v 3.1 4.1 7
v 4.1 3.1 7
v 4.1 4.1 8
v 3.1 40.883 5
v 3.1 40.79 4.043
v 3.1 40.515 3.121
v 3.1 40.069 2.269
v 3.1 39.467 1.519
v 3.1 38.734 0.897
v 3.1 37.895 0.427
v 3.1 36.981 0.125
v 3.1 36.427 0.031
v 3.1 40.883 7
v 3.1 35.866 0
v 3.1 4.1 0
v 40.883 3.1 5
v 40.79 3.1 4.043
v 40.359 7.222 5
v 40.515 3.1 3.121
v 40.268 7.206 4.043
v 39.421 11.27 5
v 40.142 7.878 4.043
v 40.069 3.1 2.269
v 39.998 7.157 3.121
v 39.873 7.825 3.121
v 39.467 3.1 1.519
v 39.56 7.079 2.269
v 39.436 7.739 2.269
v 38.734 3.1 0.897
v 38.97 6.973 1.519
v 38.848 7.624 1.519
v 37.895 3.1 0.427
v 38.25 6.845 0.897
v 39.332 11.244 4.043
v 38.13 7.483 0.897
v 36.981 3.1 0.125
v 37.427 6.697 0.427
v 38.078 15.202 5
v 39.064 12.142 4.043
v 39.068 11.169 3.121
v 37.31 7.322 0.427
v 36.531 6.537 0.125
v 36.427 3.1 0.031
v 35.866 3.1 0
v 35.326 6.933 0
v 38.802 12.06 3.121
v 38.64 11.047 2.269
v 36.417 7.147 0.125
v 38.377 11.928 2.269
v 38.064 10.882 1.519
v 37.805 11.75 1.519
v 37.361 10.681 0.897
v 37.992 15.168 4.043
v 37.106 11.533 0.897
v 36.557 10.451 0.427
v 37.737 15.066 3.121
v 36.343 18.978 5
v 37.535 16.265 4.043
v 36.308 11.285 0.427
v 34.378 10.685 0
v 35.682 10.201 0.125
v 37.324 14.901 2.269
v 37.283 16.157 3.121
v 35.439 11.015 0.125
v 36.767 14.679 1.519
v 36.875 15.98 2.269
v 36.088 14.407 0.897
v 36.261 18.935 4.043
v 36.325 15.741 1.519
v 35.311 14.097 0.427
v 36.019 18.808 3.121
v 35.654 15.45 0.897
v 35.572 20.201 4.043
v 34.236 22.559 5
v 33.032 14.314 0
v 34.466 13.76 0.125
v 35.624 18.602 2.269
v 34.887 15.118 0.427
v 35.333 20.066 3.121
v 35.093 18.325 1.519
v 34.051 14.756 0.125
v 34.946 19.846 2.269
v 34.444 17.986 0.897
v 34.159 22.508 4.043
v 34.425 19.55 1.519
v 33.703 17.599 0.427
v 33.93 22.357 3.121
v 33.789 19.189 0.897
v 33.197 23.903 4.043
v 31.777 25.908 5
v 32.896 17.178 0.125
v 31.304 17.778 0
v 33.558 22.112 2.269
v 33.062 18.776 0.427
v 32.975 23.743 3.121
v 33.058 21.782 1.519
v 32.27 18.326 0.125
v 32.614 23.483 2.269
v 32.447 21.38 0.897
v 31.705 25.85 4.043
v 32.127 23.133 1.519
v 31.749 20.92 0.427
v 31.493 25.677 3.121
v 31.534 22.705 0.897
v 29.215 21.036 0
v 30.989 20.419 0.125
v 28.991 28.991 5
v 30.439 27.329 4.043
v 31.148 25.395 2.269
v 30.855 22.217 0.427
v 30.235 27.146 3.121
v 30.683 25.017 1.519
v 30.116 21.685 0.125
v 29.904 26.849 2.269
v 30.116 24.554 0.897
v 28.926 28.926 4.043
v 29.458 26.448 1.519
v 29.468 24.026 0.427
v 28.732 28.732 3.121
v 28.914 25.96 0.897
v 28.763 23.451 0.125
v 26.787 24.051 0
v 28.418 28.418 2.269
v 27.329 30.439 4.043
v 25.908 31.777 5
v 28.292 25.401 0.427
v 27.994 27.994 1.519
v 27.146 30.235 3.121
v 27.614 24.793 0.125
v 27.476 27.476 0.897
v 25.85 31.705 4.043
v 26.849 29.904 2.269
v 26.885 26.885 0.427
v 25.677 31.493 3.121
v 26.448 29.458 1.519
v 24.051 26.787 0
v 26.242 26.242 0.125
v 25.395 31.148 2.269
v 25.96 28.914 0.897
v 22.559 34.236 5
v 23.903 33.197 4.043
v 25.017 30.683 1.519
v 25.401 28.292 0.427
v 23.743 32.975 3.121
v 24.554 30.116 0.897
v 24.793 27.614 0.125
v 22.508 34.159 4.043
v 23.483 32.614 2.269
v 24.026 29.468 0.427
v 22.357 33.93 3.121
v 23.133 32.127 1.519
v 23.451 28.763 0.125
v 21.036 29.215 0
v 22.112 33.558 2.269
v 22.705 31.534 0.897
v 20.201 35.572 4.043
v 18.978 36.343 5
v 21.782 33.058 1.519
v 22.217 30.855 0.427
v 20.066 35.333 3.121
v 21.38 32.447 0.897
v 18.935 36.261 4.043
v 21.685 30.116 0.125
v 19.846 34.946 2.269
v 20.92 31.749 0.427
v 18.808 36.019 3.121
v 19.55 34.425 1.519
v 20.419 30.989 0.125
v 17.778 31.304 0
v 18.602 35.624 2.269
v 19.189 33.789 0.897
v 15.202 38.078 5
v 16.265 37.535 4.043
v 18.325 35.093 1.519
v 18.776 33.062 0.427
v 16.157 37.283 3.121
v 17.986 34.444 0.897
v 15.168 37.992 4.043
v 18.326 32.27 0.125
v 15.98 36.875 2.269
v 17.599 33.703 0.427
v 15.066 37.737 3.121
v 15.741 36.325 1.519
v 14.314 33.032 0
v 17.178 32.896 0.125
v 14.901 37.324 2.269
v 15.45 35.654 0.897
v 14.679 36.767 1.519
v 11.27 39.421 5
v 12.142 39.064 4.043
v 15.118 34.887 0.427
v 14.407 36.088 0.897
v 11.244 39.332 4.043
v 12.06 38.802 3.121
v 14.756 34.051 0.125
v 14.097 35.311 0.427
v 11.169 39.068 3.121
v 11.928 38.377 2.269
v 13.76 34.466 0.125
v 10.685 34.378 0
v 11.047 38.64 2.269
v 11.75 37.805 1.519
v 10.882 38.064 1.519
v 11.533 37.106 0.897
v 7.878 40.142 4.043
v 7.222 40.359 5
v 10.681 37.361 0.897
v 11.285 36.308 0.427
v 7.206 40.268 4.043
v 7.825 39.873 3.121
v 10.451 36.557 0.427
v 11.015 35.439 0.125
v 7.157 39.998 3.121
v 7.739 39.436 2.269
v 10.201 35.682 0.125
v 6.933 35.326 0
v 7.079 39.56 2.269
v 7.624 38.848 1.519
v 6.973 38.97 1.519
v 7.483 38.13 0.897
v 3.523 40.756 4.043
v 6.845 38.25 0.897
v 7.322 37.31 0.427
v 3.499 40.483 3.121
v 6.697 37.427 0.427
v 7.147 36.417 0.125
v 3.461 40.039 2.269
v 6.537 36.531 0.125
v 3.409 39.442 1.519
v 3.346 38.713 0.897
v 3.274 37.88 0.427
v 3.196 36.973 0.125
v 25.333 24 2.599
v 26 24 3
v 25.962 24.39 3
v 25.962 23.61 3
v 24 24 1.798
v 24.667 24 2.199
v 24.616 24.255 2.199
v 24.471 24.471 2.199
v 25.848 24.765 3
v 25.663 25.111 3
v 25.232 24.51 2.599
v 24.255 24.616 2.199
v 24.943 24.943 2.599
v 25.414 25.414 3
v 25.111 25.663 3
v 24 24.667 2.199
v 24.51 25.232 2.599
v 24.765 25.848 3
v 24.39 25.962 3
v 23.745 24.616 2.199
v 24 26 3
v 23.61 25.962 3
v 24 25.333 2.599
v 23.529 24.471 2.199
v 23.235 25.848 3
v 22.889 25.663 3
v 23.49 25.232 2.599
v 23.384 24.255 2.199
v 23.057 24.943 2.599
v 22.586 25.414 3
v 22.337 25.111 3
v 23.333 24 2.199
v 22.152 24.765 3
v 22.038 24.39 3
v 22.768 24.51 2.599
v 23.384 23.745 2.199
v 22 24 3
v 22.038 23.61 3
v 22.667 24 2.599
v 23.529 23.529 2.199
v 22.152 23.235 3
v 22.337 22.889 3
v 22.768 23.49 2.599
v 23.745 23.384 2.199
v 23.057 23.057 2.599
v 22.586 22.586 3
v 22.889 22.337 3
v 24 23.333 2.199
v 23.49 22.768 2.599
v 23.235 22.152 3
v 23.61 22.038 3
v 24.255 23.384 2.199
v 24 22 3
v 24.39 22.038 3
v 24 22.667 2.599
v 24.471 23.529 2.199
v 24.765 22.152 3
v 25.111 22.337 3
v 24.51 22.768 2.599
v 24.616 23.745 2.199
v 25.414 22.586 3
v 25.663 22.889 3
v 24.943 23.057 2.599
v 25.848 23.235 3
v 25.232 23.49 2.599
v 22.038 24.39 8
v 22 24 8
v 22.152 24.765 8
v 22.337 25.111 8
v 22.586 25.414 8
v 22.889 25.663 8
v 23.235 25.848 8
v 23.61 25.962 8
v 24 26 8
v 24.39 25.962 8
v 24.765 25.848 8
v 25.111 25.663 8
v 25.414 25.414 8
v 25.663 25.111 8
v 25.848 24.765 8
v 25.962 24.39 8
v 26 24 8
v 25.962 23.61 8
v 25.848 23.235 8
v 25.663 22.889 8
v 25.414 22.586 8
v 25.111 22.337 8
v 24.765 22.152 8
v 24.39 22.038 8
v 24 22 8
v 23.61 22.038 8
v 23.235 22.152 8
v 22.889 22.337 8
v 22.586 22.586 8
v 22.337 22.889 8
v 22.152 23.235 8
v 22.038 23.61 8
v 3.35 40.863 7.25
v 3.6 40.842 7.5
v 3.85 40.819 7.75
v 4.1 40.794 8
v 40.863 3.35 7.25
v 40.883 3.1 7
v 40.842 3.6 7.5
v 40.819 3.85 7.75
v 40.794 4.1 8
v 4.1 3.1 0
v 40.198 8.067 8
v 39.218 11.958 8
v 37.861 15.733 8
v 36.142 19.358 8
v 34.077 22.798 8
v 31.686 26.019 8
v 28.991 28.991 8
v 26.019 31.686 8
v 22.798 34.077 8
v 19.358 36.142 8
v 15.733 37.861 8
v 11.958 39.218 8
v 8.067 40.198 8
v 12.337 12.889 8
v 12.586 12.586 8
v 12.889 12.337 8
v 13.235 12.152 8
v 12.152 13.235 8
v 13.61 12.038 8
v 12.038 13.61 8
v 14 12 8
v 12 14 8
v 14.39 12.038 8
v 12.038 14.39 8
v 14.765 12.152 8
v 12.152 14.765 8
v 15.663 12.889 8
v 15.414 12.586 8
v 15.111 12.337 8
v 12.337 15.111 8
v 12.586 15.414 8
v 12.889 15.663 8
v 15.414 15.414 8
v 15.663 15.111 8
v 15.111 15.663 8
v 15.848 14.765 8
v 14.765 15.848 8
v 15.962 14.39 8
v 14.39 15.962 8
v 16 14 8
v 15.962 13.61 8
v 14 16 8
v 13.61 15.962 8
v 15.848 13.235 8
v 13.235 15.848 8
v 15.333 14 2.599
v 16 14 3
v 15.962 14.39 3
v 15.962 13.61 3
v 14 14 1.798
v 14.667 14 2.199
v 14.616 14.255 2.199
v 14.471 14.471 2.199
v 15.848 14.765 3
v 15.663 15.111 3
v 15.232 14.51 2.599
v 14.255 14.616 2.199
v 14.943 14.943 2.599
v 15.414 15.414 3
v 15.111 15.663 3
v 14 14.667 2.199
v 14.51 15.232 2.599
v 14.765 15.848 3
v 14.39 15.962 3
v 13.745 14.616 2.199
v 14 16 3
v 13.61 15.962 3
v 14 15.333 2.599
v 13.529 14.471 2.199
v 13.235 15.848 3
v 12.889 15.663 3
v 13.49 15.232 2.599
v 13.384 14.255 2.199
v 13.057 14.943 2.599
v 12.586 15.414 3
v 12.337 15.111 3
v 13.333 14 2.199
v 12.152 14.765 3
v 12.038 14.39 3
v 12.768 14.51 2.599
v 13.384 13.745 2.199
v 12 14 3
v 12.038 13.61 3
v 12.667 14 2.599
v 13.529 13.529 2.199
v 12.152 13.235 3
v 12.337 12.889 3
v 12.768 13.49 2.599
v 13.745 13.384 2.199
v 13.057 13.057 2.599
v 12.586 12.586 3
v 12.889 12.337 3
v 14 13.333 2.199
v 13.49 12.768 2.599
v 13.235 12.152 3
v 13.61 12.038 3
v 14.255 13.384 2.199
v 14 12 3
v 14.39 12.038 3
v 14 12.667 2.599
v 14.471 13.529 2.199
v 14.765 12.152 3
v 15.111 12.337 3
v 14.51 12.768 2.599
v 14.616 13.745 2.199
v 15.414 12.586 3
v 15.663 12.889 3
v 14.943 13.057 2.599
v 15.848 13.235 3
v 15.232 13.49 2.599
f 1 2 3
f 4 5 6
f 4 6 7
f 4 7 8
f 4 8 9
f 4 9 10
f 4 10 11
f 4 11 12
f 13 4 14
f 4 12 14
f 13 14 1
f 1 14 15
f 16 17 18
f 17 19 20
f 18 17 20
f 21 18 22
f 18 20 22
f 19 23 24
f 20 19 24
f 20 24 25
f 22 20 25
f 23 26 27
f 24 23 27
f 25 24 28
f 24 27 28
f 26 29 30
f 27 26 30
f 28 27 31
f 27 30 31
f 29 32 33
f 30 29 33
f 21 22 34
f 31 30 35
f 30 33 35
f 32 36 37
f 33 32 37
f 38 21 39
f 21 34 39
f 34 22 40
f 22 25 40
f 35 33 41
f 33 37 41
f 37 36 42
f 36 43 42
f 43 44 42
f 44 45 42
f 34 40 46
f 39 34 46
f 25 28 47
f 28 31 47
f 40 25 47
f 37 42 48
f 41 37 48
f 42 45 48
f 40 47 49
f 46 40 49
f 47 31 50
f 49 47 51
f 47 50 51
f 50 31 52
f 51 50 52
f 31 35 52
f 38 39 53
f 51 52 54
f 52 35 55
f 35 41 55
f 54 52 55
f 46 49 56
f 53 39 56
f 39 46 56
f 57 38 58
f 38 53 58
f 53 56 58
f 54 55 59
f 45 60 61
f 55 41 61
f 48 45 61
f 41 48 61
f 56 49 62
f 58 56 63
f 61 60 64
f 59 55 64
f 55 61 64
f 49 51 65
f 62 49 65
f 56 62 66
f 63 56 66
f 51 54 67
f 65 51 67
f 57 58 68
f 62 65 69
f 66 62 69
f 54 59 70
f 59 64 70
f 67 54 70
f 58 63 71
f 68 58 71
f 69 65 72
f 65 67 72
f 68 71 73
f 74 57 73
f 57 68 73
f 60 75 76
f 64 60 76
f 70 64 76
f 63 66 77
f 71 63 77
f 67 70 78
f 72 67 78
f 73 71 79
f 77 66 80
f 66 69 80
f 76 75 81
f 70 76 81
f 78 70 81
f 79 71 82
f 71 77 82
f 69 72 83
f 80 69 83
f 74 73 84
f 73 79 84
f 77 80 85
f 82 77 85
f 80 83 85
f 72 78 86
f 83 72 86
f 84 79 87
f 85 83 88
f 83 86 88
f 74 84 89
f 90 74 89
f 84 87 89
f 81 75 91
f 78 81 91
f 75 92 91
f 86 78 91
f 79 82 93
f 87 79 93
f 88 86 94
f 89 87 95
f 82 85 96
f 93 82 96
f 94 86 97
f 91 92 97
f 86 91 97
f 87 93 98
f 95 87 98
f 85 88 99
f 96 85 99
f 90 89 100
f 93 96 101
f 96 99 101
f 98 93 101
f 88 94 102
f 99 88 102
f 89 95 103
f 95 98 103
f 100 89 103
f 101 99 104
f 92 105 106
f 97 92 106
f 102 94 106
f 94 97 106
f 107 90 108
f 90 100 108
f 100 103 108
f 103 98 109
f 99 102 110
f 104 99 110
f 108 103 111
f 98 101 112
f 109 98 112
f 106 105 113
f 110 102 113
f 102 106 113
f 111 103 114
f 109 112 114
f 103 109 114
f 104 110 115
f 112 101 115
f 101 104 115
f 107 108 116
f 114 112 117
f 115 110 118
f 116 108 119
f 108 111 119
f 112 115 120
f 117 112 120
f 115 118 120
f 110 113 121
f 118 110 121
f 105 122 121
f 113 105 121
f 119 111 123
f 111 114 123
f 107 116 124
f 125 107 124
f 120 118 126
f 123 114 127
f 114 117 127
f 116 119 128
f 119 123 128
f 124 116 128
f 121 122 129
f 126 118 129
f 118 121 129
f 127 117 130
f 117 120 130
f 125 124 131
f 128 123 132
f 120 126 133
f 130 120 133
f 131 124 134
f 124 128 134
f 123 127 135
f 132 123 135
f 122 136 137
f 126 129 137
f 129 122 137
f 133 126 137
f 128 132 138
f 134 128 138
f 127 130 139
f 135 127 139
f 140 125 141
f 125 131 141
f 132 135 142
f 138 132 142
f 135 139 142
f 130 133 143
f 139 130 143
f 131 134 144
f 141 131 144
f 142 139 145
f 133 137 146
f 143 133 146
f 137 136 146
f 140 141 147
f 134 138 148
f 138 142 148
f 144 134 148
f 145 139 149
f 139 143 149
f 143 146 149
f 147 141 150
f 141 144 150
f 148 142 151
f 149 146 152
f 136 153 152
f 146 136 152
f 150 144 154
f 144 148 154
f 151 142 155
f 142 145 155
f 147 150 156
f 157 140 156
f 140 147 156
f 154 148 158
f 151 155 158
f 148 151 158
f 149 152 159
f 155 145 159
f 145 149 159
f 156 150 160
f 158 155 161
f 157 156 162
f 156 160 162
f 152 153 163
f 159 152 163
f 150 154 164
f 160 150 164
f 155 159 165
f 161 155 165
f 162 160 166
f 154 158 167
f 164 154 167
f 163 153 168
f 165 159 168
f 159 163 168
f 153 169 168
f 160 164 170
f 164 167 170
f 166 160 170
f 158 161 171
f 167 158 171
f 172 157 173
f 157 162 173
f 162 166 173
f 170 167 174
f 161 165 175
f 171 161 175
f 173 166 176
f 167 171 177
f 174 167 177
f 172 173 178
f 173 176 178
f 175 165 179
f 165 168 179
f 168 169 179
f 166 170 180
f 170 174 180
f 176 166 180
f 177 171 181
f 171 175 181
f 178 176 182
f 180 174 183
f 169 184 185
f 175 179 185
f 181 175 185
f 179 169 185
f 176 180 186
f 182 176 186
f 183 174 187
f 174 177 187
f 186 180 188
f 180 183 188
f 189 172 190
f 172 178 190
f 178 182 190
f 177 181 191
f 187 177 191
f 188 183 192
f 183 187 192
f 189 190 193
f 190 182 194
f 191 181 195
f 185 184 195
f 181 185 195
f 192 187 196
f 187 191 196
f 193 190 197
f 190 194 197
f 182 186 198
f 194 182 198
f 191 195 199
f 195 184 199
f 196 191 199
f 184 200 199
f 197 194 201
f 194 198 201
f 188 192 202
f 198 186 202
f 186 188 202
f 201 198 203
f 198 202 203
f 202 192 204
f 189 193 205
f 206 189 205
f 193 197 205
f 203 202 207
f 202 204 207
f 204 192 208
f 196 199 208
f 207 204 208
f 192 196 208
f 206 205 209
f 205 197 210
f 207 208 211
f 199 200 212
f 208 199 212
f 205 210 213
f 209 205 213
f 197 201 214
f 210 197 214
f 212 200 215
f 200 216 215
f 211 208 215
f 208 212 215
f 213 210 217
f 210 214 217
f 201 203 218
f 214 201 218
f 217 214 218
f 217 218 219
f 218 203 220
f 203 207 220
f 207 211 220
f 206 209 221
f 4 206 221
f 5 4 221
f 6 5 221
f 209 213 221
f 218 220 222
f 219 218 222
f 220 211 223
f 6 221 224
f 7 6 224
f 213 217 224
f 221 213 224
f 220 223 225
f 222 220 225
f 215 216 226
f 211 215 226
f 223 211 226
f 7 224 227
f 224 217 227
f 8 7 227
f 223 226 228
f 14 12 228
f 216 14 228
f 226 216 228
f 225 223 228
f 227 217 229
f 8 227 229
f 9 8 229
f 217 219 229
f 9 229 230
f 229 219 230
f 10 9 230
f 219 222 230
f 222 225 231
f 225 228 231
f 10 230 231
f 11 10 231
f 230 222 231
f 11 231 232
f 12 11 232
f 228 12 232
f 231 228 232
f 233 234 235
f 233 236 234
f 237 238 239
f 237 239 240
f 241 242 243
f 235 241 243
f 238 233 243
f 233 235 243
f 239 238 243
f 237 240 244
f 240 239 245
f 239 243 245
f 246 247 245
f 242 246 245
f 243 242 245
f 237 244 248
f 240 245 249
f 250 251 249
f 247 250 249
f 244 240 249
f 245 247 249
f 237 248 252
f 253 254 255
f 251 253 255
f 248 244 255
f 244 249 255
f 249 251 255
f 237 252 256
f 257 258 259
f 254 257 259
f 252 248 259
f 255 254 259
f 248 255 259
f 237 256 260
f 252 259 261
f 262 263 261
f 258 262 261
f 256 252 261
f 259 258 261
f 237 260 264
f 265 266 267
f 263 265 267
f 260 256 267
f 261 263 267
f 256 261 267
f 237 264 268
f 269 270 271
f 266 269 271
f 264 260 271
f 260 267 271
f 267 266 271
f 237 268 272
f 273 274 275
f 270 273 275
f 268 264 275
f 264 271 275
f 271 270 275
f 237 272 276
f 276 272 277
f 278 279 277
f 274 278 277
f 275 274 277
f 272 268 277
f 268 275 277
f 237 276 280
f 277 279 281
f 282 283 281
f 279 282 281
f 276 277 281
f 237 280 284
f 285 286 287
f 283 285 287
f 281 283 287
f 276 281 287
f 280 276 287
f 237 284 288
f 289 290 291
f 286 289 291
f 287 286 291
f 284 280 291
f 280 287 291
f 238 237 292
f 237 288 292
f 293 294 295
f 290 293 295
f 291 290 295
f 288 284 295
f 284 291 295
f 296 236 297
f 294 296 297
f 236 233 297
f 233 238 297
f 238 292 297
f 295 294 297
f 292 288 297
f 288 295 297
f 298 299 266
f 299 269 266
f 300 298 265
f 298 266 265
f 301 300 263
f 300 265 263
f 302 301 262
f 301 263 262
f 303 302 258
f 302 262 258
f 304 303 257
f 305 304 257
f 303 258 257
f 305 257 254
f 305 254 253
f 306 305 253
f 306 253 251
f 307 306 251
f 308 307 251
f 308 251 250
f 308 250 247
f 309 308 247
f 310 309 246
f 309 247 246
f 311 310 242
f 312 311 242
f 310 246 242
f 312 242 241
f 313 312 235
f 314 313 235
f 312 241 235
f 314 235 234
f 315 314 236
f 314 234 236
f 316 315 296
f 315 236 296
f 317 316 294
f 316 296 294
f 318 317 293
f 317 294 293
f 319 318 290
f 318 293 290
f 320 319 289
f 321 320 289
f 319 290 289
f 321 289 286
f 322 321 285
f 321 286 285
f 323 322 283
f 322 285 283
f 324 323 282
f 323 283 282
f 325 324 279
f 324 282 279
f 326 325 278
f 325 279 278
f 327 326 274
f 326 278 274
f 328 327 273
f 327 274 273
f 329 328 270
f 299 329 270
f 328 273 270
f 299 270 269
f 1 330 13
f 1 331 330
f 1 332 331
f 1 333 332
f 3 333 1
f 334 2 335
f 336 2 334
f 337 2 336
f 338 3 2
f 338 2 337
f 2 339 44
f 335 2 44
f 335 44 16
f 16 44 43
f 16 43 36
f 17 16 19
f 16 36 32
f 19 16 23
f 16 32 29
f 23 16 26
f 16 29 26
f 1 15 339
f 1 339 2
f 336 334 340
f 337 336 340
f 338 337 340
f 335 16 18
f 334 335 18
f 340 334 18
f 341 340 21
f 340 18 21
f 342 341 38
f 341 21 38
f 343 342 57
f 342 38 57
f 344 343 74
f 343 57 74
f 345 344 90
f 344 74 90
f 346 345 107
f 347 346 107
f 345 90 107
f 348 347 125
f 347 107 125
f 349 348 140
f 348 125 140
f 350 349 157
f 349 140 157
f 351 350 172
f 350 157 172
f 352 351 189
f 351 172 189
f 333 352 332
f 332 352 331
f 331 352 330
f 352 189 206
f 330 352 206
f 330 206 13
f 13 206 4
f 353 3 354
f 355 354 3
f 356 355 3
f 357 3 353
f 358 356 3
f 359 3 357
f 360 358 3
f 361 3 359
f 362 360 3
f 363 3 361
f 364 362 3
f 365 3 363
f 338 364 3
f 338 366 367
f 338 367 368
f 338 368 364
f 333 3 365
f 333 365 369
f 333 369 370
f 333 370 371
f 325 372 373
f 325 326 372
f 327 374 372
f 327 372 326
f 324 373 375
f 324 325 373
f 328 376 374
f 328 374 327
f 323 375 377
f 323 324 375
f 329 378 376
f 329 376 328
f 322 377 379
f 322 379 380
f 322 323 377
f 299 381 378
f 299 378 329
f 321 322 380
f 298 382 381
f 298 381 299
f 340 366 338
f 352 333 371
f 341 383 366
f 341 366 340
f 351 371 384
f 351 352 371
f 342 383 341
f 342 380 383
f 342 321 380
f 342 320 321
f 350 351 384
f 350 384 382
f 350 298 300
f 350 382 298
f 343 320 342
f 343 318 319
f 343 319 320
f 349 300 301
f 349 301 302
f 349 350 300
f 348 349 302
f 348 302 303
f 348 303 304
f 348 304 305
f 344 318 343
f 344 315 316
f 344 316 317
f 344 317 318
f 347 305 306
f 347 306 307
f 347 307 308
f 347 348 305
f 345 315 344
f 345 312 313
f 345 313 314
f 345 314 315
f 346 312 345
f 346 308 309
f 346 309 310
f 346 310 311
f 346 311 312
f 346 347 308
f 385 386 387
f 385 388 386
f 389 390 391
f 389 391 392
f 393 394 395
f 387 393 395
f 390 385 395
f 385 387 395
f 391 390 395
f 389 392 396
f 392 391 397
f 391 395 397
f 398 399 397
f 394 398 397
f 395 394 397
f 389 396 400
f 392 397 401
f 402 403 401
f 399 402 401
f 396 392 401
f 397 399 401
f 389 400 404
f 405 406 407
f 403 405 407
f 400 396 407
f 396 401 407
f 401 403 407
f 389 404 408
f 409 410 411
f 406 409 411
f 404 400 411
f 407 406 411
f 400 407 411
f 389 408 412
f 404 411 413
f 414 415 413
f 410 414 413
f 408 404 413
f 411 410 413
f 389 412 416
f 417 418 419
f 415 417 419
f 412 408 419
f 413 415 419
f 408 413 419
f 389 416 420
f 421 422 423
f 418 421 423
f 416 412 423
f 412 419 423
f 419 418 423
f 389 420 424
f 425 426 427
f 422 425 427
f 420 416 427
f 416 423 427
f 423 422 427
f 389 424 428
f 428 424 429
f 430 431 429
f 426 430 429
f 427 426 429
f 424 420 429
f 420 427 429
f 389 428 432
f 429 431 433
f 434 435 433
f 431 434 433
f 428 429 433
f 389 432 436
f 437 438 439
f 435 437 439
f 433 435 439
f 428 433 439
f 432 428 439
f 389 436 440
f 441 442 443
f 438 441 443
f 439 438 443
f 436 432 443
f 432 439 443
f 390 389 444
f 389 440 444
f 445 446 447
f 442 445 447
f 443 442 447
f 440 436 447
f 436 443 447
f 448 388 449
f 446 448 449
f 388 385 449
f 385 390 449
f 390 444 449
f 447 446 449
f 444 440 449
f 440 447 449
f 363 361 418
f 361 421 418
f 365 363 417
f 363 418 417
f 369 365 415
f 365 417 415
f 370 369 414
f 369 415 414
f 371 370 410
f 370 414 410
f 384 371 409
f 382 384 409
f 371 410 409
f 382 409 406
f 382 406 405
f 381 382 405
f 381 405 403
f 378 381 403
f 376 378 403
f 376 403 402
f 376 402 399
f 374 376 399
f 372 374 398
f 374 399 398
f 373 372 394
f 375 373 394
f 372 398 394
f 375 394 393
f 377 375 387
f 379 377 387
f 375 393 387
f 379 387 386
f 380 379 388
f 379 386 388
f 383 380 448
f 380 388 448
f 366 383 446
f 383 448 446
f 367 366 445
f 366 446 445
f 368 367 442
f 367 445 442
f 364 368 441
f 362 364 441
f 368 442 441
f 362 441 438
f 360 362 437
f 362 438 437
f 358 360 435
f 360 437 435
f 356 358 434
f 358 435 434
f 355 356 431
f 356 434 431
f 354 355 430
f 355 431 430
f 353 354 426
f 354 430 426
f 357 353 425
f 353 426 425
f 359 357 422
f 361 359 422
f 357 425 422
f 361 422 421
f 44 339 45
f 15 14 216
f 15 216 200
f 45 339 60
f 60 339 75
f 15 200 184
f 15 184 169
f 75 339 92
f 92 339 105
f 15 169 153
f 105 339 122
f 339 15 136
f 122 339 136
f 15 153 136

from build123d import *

# Parameters (mm, degrees)
F1_DEPTH = 8
F3_D     = 4
F3_DEPTH = 5
F3_TIP   = 1.2017212381
F4_SIZE  = 1
F5_R     = 5


with BuildPart() as f1:
    # F0 (on Top) → F1 (new body)
    with BuildSketch(Plane.XY):
        with BuildLine():
            Line((3.1, 3.1), (40.8826369013, 3.1))
            ThreePointArc((40.8826369013, 3.1), (28.9913780286, 28.9913780286), (3.1, 40.8826369013))
            Line((3.1, 40.8826369013), (3.1, 3.1))
        make_face()
    extrude(amount=F1_DEPTH)

    # F3
    with Locations(Plane.XY.offset(8)):
        with Locations((14, 14), (24, 24)):
            Hole(F3_D / 2, depth=F3_DEPTH)
            with Locations((0, 0, -(F3_DEPTH + F3_TIP / 2))):  # 118° drill point
                Cone(0, F3_D / 2, F3_TIP, mode=Mode.SUBTRACT)

    # F4
    f4_edges = [f1.edges().sort_by_distance(p)[0] for p in [
        (3.1, 3.1, 4),
        (21.991318, 3.1, 8),
        (3.1, 21.991318, 8),
    ]]
    chamfer(f4_edges, length=F4_SIZE)

    # F5
    f5_edges = [f1.edges().sort_by_distance(p)[0] for p in [
        (28.991378, 28.991378, 0),
    ]]
    fillet(f5_edges, radius=F5_R)


solid = f1.part
